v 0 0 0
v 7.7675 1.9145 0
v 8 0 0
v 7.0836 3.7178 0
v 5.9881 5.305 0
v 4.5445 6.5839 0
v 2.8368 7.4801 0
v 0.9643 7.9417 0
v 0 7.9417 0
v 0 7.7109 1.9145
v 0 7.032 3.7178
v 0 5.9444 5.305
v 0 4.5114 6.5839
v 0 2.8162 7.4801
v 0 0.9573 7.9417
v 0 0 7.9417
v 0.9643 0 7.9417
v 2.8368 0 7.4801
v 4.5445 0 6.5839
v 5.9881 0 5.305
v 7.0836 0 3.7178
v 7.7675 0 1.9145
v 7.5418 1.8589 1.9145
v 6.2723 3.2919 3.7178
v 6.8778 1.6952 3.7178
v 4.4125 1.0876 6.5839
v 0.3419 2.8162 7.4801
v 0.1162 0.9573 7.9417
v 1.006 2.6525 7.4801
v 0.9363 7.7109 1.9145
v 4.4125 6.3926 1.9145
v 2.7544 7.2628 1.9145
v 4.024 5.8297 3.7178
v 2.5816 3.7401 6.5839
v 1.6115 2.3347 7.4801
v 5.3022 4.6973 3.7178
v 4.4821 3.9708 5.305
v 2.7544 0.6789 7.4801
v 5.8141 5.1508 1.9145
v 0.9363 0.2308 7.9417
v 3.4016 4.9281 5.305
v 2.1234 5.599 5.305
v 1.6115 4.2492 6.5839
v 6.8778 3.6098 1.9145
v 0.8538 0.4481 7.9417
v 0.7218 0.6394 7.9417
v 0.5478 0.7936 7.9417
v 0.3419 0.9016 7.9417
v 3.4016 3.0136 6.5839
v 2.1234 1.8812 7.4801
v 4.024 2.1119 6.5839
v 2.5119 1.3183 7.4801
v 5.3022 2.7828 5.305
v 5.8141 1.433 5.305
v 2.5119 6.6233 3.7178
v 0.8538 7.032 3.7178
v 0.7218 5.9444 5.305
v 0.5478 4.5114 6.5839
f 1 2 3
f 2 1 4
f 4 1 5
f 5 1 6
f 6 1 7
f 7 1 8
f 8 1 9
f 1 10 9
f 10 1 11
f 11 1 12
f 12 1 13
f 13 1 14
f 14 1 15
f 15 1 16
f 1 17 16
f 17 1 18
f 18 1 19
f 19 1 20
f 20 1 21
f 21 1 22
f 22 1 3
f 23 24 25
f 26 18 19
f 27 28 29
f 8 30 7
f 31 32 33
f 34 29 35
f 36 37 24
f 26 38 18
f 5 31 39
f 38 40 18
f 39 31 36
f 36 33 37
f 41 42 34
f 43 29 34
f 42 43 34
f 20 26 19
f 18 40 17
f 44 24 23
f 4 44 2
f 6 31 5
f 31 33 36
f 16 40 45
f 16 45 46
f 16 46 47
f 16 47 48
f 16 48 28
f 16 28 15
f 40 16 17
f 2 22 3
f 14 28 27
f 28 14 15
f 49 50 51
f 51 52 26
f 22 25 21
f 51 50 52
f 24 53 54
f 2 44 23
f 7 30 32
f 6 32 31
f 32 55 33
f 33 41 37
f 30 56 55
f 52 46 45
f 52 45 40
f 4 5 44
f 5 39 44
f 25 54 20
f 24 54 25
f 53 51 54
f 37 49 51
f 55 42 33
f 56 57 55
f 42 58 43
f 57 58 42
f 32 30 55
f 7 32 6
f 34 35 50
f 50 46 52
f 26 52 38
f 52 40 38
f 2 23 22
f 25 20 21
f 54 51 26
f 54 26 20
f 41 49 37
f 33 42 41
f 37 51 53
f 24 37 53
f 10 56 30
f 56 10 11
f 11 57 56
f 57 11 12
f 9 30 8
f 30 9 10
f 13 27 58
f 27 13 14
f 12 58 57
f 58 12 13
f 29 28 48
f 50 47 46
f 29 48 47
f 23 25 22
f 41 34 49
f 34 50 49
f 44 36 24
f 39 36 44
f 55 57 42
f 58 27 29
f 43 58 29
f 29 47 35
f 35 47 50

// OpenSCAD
// model29.scad - Test intersection operation
intersection() {
    cube(10);
    sphere(8);
}
